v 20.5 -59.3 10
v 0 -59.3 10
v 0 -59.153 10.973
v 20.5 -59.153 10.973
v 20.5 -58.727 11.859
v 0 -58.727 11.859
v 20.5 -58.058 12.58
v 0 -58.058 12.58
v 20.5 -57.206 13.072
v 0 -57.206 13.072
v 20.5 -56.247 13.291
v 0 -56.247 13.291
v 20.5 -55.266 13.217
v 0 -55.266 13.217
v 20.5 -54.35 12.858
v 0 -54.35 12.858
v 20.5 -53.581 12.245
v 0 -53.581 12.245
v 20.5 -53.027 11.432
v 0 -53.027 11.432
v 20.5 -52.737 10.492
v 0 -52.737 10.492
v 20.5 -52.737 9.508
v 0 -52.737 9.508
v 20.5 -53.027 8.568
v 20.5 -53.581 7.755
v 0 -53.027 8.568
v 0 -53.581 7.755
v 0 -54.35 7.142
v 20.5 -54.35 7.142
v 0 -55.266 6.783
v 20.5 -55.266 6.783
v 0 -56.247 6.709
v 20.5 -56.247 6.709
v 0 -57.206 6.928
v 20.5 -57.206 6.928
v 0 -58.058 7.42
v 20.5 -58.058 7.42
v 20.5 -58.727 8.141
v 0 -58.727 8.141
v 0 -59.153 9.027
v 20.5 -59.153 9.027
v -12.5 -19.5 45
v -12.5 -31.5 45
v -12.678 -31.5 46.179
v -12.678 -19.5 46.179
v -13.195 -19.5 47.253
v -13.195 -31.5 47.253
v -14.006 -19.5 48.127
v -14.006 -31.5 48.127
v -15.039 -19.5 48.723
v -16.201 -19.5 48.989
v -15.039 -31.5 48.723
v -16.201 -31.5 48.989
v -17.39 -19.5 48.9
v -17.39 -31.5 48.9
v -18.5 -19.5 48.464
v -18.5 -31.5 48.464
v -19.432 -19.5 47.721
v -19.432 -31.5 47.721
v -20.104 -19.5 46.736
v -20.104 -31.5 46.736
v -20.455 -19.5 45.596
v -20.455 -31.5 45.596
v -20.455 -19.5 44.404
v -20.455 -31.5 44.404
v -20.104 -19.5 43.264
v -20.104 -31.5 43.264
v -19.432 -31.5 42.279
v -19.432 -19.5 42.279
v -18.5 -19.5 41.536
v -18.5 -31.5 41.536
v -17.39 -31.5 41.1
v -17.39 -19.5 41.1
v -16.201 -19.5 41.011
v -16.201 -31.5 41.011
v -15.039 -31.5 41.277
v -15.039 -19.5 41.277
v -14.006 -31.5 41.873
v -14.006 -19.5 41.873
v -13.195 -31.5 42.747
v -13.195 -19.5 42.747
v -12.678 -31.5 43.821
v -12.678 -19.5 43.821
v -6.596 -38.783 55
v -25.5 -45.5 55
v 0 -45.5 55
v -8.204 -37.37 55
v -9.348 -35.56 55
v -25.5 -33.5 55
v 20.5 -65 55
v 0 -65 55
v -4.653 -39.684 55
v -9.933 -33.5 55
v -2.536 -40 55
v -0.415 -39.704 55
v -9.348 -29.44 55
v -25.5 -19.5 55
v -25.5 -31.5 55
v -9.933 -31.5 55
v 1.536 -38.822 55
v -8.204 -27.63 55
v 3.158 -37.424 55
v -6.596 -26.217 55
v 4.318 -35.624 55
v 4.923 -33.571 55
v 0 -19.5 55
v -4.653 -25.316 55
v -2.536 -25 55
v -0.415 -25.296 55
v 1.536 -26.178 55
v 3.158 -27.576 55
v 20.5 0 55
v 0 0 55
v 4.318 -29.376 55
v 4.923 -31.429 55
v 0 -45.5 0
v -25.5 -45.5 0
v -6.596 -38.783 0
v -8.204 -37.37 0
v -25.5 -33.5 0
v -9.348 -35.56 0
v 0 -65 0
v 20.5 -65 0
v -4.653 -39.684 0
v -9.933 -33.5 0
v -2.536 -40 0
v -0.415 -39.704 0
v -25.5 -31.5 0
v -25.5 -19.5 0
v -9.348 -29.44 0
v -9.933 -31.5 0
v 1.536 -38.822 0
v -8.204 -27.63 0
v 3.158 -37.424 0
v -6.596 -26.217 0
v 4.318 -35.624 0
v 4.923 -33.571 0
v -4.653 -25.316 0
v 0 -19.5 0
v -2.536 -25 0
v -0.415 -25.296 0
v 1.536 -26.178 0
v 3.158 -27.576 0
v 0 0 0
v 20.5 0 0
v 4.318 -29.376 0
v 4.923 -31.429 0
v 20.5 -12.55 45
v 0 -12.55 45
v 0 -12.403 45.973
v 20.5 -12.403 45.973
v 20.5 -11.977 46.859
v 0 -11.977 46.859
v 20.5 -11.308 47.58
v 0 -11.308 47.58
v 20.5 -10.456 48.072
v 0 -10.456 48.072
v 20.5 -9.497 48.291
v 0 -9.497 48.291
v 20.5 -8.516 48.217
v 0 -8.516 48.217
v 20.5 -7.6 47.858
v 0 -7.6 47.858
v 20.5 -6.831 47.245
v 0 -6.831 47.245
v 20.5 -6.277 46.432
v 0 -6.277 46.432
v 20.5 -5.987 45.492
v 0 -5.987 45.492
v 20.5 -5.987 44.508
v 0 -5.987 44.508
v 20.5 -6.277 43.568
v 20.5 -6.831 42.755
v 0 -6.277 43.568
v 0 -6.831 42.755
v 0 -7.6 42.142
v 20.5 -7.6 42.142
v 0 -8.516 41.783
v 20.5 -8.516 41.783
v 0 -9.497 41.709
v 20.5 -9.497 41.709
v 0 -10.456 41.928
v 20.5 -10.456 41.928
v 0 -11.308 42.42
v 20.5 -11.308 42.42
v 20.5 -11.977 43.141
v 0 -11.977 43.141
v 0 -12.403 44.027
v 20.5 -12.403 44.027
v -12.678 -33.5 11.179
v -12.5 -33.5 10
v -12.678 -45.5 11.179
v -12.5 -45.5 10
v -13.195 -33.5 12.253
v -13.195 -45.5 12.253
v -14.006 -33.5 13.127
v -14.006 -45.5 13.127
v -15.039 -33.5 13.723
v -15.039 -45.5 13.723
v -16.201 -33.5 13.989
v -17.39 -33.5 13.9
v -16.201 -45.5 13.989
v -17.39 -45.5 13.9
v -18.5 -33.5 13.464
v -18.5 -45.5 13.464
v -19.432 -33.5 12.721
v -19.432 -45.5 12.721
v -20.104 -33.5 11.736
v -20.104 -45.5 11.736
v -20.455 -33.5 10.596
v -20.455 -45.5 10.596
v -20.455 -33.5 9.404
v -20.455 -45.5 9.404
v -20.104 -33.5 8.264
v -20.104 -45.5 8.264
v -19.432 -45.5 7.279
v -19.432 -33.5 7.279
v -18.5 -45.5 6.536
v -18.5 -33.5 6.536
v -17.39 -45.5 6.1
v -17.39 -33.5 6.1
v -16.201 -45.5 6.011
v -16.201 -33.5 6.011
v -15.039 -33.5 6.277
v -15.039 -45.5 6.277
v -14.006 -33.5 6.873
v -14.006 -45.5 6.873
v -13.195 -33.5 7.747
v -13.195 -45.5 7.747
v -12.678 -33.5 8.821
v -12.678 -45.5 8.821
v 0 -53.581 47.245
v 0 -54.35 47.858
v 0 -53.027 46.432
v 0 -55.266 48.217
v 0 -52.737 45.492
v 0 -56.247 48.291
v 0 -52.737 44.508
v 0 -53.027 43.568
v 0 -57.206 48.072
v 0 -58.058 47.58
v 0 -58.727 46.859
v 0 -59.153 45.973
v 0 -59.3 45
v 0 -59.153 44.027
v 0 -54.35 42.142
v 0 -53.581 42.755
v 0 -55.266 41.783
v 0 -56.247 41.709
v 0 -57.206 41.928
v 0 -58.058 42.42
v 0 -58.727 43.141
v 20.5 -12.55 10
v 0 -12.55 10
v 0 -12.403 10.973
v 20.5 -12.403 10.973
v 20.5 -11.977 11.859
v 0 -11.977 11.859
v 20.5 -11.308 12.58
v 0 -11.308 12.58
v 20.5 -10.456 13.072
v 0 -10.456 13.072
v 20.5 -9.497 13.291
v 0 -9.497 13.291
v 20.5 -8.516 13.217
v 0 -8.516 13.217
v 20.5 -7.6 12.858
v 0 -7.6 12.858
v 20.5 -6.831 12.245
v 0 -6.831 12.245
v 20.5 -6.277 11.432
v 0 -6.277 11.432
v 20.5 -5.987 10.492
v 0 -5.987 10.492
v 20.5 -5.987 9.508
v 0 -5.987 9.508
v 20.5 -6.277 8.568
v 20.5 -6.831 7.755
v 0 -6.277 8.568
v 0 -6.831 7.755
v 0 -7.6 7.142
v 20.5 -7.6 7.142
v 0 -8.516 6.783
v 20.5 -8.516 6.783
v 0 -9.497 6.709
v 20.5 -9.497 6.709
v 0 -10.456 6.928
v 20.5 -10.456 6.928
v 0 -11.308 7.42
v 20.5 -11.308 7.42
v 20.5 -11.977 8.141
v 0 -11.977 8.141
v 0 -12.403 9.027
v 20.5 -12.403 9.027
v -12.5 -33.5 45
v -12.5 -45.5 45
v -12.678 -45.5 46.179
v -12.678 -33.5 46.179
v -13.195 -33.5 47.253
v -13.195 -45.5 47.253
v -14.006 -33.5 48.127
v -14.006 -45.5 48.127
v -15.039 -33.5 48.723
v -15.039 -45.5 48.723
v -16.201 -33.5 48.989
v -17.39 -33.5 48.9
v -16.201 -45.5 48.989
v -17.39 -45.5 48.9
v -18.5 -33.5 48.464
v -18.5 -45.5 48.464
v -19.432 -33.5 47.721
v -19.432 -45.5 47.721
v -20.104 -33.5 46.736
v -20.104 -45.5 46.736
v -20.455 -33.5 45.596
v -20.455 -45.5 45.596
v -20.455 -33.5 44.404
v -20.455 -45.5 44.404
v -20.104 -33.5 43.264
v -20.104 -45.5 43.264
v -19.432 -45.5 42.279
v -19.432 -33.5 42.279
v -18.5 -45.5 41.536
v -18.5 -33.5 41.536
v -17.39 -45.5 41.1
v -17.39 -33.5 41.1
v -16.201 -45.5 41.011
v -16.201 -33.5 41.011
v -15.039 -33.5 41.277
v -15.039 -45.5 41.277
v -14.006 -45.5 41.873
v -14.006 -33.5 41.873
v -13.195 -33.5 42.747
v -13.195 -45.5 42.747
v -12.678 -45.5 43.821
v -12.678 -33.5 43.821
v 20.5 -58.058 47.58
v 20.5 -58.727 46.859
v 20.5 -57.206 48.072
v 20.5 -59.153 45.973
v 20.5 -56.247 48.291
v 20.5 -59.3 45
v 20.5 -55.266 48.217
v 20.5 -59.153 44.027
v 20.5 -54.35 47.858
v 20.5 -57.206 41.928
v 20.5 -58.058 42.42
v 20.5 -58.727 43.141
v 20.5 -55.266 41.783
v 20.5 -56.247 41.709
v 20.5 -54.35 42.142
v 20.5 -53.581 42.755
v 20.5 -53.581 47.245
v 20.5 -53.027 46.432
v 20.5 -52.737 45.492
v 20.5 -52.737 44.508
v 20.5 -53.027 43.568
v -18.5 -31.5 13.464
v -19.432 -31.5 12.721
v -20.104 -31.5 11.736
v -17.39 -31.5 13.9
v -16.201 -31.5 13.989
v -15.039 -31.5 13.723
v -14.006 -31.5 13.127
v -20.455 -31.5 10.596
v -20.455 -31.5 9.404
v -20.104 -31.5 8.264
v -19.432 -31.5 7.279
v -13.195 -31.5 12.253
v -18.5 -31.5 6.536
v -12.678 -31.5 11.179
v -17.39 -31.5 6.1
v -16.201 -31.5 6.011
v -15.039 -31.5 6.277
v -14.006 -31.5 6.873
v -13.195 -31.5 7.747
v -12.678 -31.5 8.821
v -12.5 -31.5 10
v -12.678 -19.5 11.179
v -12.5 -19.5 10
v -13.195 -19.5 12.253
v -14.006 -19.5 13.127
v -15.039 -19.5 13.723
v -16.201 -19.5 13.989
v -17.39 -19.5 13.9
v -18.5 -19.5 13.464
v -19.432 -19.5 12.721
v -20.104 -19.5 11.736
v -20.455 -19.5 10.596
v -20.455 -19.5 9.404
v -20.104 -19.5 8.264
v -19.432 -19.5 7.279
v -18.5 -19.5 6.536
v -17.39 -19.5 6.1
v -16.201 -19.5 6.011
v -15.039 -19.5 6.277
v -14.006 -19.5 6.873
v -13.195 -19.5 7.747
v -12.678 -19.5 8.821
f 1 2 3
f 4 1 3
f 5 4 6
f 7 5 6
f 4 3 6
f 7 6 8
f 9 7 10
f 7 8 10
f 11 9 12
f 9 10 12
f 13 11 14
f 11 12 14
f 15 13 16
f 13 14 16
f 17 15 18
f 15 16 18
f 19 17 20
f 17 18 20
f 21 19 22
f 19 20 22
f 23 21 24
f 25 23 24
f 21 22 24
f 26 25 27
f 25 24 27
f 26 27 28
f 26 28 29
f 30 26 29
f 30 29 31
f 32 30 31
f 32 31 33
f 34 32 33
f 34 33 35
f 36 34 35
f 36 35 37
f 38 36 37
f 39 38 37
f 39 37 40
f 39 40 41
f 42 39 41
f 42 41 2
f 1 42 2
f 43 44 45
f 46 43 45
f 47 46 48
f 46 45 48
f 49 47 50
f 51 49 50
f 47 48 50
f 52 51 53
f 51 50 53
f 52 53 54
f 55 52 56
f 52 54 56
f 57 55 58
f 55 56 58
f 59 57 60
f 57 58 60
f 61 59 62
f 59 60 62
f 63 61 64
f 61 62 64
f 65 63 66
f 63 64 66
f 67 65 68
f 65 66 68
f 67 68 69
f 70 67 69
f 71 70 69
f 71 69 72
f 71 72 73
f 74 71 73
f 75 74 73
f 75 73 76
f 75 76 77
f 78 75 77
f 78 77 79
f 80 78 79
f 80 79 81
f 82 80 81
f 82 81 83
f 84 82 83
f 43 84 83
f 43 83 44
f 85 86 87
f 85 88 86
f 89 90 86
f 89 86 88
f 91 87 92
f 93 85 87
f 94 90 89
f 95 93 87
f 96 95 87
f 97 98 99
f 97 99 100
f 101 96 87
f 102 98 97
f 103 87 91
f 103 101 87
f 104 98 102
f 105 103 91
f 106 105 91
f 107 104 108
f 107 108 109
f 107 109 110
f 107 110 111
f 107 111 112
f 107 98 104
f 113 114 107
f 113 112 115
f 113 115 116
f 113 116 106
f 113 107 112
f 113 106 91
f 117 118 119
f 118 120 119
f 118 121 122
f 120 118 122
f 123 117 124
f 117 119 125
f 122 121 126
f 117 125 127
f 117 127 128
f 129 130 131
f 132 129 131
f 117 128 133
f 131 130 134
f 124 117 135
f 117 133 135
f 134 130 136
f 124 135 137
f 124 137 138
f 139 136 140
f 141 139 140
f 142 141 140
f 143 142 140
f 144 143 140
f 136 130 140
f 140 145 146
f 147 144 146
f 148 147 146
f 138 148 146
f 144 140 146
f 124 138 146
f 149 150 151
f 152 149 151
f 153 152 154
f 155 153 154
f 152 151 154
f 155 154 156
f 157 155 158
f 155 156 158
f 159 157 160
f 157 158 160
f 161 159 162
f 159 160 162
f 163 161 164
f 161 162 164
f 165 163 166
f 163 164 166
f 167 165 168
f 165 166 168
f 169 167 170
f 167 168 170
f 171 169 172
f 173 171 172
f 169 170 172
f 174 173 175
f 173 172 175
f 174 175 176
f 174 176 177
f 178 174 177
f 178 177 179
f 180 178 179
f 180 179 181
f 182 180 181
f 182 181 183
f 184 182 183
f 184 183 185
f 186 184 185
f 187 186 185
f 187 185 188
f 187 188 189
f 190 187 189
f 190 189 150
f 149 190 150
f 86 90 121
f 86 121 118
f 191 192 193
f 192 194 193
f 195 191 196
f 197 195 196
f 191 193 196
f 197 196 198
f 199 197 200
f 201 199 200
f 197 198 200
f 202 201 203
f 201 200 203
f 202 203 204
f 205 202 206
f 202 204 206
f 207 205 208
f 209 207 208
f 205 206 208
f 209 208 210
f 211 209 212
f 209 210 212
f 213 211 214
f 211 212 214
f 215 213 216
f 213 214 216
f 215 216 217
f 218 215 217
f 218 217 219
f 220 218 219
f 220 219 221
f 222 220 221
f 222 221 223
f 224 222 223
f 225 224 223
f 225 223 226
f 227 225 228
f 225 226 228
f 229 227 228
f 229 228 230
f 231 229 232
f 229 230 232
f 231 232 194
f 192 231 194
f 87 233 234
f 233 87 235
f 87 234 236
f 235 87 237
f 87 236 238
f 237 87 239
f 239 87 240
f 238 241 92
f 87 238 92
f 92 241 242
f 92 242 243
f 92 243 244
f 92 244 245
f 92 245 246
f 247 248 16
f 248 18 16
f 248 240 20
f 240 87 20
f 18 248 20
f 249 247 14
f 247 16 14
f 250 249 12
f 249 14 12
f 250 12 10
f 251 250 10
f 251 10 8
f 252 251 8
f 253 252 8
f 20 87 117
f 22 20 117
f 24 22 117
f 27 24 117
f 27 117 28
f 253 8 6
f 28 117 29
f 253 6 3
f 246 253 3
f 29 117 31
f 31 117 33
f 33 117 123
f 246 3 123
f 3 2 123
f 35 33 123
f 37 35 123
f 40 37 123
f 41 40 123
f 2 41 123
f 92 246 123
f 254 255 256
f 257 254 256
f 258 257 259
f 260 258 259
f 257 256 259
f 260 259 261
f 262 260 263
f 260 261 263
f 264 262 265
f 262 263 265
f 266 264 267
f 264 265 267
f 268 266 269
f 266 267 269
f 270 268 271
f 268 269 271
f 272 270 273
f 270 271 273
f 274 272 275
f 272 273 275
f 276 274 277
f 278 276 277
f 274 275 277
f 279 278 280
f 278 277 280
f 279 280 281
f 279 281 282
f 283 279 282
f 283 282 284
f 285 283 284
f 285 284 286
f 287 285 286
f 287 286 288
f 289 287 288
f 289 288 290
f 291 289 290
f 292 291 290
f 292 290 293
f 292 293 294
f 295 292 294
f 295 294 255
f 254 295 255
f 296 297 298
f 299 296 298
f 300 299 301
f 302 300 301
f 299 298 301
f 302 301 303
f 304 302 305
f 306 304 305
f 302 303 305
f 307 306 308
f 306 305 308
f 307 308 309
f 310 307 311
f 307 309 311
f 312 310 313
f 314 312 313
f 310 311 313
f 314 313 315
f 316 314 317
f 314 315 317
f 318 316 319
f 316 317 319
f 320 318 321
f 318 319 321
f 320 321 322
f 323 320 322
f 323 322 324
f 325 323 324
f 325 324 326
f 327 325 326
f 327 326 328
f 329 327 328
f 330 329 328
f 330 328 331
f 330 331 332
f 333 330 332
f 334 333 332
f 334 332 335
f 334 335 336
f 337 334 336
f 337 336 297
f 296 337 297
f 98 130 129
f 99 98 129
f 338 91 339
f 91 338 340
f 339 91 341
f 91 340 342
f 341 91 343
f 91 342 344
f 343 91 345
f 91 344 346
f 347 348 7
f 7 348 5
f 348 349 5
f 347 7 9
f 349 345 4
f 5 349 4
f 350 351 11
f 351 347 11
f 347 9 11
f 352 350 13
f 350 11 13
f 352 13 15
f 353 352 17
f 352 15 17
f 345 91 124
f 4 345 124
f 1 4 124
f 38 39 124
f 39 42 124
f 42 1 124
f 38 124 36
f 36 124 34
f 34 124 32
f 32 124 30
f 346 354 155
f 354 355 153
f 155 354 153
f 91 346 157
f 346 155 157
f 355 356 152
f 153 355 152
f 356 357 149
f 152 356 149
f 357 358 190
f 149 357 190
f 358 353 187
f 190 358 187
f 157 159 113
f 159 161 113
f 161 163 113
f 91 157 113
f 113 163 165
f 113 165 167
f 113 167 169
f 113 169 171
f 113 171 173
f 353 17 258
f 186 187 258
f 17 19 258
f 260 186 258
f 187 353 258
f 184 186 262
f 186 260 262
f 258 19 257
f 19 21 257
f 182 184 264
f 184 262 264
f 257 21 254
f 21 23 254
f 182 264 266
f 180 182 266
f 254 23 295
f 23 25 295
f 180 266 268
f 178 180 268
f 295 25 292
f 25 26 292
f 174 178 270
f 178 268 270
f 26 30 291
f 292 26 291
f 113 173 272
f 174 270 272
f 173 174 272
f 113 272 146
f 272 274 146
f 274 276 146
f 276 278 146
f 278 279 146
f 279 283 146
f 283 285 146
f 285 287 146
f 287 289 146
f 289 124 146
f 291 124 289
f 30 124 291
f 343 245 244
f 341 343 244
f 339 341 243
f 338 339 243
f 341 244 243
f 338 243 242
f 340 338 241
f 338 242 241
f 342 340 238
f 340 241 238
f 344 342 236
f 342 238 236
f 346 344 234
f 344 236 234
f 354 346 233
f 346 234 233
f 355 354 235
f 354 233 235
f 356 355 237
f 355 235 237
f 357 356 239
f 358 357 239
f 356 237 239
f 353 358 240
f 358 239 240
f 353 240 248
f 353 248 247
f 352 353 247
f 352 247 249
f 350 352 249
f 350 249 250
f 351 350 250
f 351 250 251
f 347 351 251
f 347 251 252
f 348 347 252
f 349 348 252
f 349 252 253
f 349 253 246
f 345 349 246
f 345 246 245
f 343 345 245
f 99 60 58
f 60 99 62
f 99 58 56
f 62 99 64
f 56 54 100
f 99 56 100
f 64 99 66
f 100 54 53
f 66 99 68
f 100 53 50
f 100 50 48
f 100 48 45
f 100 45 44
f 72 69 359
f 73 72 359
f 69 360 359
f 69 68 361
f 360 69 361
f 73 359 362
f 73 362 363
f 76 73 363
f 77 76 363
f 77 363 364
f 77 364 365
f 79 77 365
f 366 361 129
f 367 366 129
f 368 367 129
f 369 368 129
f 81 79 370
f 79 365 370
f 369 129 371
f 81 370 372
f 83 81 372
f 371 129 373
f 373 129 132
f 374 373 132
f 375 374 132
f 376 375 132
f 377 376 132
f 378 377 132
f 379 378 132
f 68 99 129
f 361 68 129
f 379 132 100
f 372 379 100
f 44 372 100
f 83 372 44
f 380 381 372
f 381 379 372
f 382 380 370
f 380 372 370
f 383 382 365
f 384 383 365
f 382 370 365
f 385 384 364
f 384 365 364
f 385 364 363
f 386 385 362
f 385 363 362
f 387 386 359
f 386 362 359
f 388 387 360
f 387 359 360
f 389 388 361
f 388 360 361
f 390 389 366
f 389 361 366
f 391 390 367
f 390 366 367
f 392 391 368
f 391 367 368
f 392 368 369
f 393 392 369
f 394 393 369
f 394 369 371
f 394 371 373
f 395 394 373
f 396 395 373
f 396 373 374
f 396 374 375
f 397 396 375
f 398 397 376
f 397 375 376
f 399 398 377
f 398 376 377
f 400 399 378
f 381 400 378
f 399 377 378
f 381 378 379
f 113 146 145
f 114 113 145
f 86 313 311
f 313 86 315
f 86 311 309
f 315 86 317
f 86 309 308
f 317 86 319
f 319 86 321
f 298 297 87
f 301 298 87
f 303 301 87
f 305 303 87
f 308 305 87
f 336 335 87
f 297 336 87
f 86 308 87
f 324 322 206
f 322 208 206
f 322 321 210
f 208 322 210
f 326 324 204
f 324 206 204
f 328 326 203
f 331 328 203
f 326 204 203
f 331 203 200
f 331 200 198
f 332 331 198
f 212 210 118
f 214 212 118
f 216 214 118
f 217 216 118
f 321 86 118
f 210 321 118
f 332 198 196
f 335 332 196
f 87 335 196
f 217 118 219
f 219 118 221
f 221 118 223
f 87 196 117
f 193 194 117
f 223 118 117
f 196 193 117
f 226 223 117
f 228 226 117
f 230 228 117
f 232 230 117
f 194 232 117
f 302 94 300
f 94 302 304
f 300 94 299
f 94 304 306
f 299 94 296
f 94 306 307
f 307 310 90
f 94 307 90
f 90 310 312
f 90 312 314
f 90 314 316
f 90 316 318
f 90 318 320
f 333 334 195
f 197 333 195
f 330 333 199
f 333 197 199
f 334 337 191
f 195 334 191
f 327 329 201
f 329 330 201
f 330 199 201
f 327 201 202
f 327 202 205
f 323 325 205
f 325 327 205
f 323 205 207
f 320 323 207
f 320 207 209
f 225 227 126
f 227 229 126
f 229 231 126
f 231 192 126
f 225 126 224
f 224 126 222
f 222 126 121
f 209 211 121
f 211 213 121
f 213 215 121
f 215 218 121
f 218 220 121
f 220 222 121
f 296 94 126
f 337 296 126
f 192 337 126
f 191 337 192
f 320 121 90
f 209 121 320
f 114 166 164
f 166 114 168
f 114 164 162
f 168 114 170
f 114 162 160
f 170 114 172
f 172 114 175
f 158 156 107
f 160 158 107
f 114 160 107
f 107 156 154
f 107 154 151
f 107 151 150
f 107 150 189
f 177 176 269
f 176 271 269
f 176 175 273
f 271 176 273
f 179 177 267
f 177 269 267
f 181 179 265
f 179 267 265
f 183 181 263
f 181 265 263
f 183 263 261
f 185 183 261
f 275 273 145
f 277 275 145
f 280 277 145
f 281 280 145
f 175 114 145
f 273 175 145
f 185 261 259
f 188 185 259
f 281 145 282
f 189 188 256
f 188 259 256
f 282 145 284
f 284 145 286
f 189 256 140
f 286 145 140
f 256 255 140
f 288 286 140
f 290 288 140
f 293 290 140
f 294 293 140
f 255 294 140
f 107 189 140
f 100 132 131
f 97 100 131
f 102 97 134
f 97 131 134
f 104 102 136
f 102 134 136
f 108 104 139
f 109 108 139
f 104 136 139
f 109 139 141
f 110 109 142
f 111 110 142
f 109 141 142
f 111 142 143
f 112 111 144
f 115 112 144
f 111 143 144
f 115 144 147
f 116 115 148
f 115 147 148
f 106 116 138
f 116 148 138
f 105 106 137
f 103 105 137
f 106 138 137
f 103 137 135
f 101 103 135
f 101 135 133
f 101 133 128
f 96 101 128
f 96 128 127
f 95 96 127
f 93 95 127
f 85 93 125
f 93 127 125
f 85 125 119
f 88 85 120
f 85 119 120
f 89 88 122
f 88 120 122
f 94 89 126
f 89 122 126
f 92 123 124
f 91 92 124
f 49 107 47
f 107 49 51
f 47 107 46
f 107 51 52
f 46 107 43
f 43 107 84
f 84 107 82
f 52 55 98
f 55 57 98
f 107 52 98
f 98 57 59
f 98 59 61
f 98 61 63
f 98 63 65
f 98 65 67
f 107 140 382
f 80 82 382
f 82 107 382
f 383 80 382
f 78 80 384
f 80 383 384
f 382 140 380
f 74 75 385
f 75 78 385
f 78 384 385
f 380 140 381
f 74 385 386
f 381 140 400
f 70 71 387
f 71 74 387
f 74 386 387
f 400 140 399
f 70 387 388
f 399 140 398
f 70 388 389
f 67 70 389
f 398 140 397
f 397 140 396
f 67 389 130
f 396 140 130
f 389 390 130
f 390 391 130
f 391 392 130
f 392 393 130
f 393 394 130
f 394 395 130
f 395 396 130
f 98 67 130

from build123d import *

# Parameters (mm, degrees)
F1_DEPTH  = 55
F3_R      = 4
F4_DEPTH  = 50
F5_R      = 4
F6_DEPTH  = 100
F8_R      = 3.3
F9_DEPTH  = 25
F10_R     = 3.3
F11_DEPTH = 25


with BuildPart() as f1:
    # F0 (on Top) → F1 (new body)
    with BuildSketch(Plane.XY):
        with BuildLine():
            Line((20.5, 0), (0, 0))
            Line((0, 0), (0, -19.5))
            Line((0, -19.5), (-25.5, -19.5))
            Line((-25.5, -19.5), (-25.5, -31.5))
            Line((-25.5, -31.5), (-9.9330343737, -31.5))
            ThreePointArc((-9.9330343737, -31.5), (5, -32.5), (-9.9330343737, -33.5))
            Line((-9.9330343737, -33.5), (-25.5, -33.5))
            Line((-25.5, -33.5), (-25.5, -45.5))
            Line((-25.5, -45.5), (0, -45.5))
            Line((0, -45.5), (0, -65))
            Line((0, -65), (20.5, -65))
            Line((20.5, -65), (20.5, 0))
        make_face()
    extrude(amount=F1_DEPTH)

    # F3 (on offset) → F4 (cut, symmetric)
    with BuildSketch(Plane.XZ.offset(45.5)):
        with Locations((-16.5, 10)):
            Circle(F3_R)
    extrude(amount=F4_DEPTH, both=True, mode=Mode.SUBTRACT)

    # F5 (on offset) → F6 (cut)
    with BuildSketch(Plane.XZ.offset(45.5)):
        with Locations((-16.5, 45)):
            Circle(F5_R)
    extrude(amount=-F6_DEPTH, mode=Mode.SUBTRACT)

    # F8 (on offset) → F9 (cut)
    with BuildSketch(Plane(origin=(0, 0, 0), x_dir=(0, -1, 0), z_dir=(-1, 0, 0))):
        with Locations((9.25, 45)):
            Circle(F8_R)
        with Locations((9.25, 10)):
            Circle(F8_R)
    extrude(amount=-F9_DEPTH, mode=Mode.SUBTRACT)

    # F10 (on offset) → F11 (cut)
    with BuildSketch(Plane(origin=(0, 0, 0), x_dir=(0, -1, 0), z_dir=(-1, 0, 0))):
        with Locations((56, 10)):
            Circle(F10_R)
        with Locations((56, 45)):
            Circle(F10_R)
    extrude(amount=-F11_DEPTH, mode=Mode.SUBTRACT)


solid = f1.part
